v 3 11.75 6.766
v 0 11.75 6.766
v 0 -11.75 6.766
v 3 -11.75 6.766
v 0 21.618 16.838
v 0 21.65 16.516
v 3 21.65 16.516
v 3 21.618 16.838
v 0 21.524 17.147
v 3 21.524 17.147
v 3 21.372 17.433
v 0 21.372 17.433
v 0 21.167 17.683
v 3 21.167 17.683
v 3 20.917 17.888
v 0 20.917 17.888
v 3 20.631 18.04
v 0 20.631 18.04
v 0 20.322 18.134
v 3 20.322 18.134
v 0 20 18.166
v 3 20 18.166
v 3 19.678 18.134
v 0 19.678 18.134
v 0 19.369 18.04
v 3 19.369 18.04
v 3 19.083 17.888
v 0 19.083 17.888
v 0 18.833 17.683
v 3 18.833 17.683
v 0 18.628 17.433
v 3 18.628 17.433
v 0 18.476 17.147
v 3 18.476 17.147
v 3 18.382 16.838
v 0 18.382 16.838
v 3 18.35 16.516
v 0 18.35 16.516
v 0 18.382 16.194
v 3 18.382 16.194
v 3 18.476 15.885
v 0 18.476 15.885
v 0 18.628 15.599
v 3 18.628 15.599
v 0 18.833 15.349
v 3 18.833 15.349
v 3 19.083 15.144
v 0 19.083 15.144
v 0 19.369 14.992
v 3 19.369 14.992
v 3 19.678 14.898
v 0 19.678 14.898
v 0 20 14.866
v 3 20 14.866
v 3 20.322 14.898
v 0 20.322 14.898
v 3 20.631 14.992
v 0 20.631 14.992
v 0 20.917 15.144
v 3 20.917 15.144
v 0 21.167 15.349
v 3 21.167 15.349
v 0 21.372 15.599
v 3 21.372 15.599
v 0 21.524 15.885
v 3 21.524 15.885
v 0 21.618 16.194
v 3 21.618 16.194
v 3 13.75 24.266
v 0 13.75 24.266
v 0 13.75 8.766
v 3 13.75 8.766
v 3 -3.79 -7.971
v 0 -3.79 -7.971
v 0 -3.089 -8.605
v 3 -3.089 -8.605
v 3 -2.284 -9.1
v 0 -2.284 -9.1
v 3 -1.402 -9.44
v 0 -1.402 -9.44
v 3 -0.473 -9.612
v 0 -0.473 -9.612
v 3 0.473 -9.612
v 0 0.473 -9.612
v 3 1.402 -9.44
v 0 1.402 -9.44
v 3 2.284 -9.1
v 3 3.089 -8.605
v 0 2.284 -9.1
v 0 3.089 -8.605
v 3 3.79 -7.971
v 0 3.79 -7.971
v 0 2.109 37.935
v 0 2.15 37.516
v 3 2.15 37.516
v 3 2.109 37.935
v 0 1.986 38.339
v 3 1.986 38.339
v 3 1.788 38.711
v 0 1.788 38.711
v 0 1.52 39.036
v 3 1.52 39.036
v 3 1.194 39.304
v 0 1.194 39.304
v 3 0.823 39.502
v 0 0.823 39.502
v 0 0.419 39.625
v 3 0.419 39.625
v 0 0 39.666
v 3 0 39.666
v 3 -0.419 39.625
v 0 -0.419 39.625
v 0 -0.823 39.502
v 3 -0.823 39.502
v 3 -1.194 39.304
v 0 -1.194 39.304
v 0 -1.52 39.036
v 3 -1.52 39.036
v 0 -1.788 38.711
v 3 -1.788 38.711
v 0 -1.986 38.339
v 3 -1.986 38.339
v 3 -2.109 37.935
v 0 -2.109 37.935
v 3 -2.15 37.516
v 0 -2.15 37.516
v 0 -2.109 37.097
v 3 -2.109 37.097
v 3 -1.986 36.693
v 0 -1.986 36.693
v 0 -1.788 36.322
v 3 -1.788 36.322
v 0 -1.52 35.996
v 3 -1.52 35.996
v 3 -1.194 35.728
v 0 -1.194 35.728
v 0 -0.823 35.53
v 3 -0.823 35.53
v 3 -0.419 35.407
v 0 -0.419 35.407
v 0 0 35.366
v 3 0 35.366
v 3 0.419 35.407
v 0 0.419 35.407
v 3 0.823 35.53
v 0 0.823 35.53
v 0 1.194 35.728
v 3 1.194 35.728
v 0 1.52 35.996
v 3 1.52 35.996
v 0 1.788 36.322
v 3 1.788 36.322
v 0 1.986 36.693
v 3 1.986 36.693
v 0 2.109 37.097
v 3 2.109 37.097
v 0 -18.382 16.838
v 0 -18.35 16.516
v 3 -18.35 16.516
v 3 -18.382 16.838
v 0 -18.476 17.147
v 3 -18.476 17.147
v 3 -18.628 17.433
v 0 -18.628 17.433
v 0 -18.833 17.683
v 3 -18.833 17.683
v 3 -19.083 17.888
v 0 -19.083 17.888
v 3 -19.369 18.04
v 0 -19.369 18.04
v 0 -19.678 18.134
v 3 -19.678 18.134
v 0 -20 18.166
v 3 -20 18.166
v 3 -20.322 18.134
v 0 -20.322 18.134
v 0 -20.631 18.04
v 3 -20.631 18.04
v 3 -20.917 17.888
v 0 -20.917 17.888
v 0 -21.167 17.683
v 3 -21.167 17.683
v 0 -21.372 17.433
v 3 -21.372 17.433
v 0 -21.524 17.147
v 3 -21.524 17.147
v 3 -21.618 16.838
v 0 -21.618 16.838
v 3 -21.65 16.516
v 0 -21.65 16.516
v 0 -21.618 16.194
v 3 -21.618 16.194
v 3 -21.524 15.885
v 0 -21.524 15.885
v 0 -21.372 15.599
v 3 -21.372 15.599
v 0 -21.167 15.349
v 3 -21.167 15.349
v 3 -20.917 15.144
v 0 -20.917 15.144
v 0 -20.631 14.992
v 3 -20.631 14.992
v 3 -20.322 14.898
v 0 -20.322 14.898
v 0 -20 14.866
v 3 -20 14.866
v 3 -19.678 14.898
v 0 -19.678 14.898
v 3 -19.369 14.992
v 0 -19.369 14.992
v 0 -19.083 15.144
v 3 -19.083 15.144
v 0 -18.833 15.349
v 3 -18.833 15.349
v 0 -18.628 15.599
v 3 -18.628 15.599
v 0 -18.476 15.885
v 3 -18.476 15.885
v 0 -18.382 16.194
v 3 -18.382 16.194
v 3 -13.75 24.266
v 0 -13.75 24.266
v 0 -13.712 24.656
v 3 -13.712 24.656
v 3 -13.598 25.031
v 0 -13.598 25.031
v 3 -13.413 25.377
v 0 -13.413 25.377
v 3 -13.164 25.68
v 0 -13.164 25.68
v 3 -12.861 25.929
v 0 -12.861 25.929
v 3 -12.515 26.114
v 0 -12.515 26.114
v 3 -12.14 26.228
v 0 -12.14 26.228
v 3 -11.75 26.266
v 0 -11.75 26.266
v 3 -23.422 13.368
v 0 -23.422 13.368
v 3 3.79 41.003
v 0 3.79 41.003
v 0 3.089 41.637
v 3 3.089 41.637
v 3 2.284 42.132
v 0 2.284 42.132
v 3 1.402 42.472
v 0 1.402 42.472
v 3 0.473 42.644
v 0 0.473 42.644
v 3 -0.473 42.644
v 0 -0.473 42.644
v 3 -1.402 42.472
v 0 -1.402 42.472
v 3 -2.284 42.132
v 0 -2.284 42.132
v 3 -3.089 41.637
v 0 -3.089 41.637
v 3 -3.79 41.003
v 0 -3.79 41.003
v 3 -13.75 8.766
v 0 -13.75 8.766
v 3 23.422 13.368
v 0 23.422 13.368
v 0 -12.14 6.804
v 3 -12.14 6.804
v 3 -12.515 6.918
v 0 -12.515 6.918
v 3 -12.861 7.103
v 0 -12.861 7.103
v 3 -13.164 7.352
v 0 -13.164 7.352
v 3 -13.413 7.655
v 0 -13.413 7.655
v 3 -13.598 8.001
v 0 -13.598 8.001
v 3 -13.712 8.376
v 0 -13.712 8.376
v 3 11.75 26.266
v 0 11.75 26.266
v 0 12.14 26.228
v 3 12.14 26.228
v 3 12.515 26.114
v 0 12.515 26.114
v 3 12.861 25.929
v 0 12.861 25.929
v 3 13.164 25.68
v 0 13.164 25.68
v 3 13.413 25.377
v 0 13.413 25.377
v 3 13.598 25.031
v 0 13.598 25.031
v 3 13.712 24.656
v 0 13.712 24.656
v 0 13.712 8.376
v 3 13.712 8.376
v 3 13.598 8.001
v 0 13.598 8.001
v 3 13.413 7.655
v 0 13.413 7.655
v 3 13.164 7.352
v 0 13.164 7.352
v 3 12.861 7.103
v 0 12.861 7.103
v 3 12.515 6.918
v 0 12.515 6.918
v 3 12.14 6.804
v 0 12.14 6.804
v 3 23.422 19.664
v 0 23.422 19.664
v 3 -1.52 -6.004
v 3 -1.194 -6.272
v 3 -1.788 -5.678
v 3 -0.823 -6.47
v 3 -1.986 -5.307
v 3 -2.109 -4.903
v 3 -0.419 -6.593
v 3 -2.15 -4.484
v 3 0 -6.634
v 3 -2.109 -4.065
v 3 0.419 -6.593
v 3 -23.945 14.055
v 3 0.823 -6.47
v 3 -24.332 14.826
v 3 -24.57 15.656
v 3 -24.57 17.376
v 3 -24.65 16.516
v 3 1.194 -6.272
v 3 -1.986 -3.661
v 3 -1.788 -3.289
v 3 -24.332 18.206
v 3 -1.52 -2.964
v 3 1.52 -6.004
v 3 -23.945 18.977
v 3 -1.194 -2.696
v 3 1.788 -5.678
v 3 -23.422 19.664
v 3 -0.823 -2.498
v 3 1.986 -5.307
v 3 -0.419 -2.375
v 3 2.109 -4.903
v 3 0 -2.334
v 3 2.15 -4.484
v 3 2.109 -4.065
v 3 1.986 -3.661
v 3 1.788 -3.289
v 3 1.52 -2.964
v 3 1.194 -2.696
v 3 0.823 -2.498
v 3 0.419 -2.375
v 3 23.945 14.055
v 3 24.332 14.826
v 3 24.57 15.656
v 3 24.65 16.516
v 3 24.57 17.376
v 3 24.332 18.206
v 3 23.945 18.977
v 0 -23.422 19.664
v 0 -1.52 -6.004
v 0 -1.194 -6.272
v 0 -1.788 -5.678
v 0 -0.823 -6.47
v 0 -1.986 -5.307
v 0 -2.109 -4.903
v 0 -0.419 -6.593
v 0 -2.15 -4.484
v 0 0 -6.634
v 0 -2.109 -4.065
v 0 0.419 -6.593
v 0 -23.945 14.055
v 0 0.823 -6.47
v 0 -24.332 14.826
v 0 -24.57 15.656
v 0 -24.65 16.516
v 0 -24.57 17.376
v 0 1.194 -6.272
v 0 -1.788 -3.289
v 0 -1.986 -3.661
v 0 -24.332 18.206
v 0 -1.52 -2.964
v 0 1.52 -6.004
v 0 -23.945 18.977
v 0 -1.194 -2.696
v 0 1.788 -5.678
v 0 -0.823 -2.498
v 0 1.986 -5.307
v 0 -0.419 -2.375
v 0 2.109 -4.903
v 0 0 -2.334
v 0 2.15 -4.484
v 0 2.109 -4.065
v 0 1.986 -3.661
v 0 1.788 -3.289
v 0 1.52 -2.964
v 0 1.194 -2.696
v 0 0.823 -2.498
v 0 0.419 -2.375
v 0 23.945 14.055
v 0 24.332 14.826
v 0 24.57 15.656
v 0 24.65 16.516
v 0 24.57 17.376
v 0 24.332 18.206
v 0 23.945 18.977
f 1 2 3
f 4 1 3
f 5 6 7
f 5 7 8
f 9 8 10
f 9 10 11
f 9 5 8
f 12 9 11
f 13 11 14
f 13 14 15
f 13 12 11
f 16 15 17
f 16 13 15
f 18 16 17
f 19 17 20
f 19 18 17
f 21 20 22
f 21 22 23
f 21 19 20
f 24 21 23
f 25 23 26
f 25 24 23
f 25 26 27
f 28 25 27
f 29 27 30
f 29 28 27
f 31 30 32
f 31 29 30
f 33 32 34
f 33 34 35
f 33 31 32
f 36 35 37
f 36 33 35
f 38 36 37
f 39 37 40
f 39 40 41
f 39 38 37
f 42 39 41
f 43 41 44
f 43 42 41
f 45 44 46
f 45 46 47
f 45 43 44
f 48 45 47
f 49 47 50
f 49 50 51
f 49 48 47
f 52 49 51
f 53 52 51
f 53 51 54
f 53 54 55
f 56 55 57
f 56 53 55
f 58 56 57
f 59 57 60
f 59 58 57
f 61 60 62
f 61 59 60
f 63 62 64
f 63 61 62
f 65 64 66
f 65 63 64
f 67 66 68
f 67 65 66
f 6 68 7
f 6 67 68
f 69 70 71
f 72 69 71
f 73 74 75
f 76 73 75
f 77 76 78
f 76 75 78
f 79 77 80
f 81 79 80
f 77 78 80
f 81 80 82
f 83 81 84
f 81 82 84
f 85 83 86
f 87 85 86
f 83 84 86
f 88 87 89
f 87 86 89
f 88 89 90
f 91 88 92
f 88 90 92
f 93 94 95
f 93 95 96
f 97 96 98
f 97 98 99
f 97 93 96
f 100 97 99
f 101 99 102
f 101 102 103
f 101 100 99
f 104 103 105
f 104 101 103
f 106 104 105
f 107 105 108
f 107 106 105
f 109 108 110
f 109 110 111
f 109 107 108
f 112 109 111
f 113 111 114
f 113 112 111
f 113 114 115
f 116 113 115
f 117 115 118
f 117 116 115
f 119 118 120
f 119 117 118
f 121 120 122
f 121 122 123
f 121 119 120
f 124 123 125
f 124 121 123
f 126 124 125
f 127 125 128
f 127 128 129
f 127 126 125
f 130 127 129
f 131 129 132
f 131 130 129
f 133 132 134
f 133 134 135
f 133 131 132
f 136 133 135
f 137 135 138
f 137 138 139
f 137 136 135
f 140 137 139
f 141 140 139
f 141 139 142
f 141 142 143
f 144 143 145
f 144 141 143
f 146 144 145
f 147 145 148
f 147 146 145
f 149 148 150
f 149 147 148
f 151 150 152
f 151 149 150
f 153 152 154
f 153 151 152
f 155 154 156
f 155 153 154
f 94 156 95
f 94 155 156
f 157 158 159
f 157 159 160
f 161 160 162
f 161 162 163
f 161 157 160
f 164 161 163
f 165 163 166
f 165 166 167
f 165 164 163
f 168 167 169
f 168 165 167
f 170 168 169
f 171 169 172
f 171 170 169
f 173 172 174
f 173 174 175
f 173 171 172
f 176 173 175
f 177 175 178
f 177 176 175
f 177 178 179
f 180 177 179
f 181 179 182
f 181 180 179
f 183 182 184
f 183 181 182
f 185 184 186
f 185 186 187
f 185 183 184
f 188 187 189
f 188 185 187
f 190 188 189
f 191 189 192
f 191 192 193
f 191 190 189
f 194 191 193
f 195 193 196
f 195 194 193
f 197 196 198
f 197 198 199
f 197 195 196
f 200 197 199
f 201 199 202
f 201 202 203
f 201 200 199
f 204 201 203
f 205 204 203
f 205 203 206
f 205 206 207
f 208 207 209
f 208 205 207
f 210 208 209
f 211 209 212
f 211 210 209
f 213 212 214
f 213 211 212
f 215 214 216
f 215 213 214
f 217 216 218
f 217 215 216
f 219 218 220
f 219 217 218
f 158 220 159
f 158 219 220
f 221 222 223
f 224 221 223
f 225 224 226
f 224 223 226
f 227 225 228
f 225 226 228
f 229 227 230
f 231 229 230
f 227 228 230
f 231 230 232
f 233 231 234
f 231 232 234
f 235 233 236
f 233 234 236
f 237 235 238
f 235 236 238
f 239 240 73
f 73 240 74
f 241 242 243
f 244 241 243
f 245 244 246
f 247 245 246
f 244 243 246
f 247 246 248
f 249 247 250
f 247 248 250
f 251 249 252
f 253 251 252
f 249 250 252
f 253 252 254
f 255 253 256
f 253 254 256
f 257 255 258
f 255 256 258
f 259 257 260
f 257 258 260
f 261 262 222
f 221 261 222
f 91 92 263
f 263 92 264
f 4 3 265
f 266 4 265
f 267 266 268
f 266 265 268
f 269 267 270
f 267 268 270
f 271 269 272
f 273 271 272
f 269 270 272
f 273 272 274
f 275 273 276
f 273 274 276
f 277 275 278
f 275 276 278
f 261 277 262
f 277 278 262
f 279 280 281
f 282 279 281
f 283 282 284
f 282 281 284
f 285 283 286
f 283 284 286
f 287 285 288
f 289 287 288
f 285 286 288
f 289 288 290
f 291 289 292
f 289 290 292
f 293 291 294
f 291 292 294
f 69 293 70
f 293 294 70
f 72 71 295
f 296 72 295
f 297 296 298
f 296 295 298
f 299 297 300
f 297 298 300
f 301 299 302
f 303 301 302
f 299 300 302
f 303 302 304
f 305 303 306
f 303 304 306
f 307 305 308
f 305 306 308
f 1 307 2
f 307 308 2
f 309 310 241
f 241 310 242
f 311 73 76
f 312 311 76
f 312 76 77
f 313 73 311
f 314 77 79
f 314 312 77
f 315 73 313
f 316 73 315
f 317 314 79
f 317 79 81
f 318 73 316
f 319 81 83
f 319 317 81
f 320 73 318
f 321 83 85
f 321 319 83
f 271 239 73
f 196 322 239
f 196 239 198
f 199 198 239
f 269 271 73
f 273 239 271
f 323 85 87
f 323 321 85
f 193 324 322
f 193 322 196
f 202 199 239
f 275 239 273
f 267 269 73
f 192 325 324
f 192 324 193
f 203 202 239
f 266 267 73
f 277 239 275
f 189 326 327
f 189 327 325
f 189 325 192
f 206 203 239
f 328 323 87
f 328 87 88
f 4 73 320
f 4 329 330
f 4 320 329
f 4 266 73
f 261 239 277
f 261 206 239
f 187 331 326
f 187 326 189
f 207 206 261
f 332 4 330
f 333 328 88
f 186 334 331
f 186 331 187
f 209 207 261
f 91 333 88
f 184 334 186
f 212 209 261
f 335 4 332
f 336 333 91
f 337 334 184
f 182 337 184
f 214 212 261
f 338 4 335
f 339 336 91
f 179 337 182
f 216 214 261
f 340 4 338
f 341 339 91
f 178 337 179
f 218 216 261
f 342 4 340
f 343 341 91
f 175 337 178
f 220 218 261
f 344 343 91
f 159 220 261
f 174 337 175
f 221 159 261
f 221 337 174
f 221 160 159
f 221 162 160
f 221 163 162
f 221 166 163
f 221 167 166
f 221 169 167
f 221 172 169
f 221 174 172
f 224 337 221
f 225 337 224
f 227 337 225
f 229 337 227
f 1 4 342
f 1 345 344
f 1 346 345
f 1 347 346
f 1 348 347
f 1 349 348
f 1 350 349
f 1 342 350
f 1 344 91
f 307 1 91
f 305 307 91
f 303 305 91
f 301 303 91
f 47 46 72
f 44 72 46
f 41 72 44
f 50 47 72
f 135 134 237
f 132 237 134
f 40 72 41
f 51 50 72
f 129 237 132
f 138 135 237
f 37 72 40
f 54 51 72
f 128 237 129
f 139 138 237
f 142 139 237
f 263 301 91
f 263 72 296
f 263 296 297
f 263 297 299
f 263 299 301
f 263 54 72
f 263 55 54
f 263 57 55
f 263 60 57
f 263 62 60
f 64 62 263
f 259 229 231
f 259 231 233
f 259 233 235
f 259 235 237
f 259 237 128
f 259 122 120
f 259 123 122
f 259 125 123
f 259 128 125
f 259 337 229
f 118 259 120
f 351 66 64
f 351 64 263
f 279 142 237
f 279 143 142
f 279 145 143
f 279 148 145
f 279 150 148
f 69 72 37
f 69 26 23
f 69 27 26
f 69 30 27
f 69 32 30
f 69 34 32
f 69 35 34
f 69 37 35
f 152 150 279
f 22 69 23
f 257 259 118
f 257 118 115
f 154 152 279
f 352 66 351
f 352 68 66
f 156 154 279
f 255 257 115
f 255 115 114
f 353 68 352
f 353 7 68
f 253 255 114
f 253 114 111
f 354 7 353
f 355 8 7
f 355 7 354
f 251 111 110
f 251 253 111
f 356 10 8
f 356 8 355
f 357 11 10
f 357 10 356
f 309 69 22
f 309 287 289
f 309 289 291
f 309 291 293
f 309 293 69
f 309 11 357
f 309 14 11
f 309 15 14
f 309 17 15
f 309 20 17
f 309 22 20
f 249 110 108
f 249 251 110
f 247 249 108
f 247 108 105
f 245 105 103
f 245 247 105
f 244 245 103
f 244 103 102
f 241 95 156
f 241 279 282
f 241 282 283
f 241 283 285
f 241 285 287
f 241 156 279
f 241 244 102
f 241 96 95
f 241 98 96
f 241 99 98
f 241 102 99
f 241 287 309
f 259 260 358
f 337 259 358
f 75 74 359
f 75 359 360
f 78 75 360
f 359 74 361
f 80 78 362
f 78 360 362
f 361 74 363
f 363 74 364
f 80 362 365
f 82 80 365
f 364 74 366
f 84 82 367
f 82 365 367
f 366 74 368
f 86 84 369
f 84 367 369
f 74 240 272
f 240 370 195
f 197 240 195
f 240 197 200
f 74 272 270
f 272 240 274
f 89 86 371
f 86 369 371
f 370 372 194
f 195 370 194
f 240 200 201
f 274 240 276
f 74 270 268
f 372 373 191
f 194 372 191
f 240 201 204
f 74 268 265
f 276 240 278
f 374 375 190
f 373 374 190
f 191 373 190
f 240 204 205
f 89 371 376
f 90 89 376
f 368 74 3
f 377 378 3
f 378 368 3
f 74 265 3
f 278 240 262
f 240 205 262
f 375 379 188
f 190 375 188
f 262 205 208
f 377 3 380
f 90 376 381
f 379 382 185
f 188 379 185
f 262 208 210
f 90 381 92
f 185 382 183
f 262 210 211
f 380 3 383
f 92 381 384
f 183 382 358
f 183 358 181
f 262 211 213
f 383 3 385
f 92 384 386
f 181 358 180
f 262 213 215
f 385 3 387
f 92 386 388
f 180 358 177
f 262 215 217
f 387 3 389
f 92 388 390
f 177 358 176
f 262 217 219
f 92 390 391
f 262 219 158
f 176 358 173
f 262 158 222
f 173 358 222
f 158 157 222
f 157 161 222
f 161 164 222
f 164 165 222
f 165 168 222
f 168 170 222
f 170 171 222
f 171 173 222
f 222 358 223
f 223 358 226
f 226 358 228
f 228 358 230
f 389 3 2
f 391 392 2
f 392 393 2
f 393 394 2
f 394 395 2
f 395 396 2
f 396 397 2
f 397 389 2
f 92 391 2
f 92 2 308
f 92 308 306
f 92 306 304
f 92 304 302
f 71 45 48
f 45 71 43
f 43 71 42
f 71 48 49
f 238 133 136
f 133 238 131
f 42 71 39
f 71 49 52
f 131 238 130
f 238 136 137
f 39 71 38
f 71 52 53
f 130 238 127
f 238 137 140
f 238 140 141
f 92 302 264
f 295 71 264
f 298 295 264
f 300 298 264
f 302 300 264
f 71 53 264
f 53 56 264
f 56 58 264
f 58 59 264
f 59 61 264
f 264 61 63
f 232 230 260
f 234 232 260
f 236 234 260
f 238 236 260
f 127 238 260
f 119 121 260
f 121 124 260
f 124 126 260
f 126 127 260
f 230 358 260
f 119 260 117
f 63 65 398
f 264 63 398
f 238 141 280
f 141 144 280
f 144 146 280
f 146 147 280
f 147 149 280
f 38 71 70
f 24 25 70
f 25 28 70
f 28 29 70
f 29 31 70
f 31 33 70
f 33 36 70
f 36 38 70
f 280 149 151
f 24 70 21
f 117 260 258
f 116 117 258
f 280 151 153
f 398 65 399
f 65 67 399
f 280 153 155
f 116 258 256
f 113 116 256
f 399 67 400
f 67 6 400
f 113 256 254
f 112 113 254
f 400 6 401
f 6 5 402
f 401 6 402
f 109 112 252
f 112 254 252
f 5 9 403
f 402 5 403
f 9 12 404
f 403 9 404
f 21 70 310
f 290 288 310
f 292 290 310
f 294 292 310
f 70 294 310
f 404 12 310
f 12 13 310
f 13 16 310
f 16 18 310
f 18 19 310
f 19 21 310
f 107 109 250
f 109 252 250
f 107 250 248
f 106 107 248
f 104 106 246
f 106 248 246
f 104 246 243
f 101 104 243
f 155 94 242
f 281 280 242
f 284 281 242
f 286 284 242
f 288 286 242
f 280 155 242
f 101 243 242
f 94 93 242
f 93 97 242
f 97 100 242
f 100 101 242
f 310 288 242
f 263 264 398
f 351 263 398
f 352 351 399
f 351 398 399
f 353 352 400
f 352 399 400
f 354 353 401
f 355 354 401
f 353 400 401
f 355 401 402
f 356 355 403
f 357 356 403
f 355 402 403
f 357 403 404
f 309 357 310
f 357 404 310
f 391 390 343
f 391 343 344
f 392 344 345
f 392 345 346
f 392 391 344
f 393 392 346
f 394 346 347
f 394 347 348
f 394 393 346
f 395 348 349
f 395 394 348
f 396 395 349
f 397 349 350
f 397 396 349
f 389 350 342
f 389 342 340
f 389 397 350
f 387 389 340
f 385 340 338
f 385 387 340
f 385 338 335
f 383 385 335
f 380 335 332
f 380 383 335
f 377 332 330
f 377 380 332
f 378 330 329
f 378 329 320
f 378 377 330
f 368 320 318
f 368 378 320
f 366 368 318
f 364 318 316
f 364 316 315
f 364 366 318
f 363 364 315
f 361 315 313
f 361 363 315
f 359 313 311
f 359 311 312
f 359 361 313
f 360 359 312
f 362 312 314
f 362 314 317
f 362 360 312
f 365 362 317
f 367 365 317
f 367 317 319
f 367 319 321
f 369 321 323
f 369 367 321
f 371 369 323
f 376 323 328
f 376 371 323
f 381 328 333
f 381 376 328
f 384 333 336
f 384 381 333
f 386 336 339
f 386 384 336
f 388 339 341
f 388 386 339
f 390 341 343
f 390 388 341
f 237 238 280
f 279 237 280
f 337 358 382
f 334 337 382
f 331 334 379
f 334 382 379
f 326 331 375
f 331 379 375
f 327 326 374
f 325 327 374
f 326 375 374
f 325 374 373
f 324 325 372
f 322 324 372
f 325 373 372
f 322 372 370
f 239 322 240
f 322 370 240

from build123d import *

# Parameters (mm, degrees)
F0_R     = 2.15
F0_R_2   = 1.65
F1_DEPTH = 3


with BuildPart() as f1:
    # F0 (on Right) → F1 (new body)
    with BuildSketch(Plane.YZ):
        with BuildLine():
            Line((23.422032, 19.664407), (3.789993, 41.002941))
            ThreePointArc((3.789993, 41.002941), (0, 42.666043), (-3.789993, 41.002941))
            Line((-3.789993, 41.002941), (-23.422032, 19.664407))
            ThreePointArc((-23.422032, 19.664407), (-24.65, 16.516043), (-23.422032, 13.367679))
            Line((-23.422032, 13.367679), (-3.789993, -7.970854))
            ThreePointArc((-3.789993, -7.970854), (0, -9.633957), (3.789993, -7.970854))
            Line((3.789993, -7.970854), (23.422032, 13.367679))
            ThreePointArc((23.422032, 13.367679), (24.65, 16.516043), (23.422032, 19.664407))
        make_face()
        with Locations((0, -4.483957)):
            Circle(F0_R, mode=Mode.SUBTRACT)
        with Locations((-20, 16.516043)):
            Circle(F0_R_2, mode=Mode.SUBTRACT)
        with BuildLine():
            ThreePointArc((-13.75, 24.266043), (-13.164214, 25.680257), (-11.75, 26.266043))
            Line((-11.75, 26.266043), (11.75, 26.266043))
            ThreePointArc((11.75, 26.266043), (13.164214, 25.680257), (13.75, 24.266043))
            Line((13.75, 24.266043), (13.75, 8.766043))
            ThreePointArc((13.75, 8.766043), (13.164214, 7.35183), (11.75, 6.766043))
            Line((11.75, 6.766043), (-11.75, 6.766043))
            ThreePointArc((-11.75, 6.766043), (-13.164214, 7.35183), (-13.75, 8.766043))
            Line((-13.75, 8.766043), (-13.75, 24.266043))
        make_face(mode=Mode.SUBTRACT)
        with Locations((0, 37.516043)):
            Circle(F0_R, mode=Mode.SUBTRACT)
        with Locations((20, 16.516043)):
            Circle(F0_R_2, mode=Mode.SUBTRACT)
    extrude(amount=F1_DEPTH)


solid = f1.part
